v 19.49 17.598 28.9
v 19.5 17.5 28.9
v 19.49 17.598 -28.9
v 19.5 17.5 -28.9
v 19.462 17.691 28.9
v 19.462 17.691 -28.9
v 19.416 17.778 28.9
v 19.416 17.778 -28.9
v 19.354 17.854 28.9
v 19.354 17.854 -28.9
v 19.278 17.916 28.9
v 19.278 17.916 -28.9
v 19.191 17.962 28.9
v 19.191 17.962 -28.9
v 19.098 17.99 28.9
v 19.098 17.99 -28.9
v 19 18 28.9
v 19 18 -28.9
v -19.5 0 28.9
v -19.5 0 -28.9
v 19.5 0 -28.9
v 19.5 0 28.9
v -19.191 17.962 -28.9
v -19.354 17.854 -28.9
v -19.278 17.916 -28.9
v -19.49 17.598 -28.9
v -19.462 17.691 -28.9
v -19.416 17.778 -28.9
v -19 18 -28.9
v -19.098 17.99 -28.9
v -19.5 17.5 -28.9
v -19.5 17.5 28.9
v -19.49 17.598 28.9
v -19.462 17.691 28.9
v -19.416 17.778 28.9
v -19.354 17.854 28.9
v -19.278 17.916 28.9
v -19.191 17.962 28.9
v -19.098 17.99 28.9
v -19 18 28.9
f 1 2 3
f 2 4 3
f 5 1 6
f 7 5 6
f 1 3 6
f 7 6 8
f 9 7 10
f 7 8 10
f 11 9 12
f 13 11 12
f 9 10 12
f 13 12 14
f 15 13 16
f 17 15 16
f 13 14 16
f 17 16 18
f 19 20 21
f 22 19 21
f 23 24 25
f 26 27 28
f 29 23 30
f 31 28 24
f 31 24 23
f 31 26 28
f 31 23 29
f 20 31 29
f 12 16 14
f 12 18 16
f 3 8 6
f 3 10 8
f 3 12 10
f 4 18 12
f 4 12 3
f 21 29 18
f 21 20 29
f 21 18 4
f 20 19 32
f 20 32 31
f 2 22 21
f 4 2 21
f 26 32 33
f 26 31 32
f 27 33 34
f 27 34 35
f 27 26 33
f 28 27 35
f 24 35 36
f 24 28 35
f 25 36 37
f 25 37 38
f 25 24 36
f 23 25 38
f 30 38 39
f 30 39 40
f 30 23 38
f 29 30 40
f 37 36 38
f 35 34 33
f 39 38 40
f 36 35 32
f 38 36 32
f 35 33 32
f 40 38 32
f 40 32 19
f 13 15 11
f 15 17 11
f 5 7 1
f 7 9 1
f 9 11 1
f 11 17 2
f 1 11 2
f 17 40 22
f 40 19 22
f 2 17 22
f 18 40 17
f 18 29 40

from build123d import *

# Parameters (mm, degrees)
SKETCH_1_W      = 39
SKETCH_1_H      = 57.8
EXTRUDE_1_DEPTH = 18
FILLET_1_R      = 0.5


with BuildPart() as part:
    # 草图1 → 凸台-拉伸1 (new body)
    with BuildSketch(Plane(origin=(0, 0, 0), x_dir=(1, 0, 0), z_dir=(0, 1, 0))):
        Rectangle(SKETCH_1_W, SKETCH_1_H)
    extrude(amount=EXTRUDE_1_DEPTH)

    # 圆角1
    fillet_1_edges = [part.edges().sort_by_distance(p)[0] for p in [
        (-19.5, 18, 0),
        (19.5, 18, 0),
    ]]
    fillet(fillet_1_edges, radius=FILLET_1_R)


solid = part.part
